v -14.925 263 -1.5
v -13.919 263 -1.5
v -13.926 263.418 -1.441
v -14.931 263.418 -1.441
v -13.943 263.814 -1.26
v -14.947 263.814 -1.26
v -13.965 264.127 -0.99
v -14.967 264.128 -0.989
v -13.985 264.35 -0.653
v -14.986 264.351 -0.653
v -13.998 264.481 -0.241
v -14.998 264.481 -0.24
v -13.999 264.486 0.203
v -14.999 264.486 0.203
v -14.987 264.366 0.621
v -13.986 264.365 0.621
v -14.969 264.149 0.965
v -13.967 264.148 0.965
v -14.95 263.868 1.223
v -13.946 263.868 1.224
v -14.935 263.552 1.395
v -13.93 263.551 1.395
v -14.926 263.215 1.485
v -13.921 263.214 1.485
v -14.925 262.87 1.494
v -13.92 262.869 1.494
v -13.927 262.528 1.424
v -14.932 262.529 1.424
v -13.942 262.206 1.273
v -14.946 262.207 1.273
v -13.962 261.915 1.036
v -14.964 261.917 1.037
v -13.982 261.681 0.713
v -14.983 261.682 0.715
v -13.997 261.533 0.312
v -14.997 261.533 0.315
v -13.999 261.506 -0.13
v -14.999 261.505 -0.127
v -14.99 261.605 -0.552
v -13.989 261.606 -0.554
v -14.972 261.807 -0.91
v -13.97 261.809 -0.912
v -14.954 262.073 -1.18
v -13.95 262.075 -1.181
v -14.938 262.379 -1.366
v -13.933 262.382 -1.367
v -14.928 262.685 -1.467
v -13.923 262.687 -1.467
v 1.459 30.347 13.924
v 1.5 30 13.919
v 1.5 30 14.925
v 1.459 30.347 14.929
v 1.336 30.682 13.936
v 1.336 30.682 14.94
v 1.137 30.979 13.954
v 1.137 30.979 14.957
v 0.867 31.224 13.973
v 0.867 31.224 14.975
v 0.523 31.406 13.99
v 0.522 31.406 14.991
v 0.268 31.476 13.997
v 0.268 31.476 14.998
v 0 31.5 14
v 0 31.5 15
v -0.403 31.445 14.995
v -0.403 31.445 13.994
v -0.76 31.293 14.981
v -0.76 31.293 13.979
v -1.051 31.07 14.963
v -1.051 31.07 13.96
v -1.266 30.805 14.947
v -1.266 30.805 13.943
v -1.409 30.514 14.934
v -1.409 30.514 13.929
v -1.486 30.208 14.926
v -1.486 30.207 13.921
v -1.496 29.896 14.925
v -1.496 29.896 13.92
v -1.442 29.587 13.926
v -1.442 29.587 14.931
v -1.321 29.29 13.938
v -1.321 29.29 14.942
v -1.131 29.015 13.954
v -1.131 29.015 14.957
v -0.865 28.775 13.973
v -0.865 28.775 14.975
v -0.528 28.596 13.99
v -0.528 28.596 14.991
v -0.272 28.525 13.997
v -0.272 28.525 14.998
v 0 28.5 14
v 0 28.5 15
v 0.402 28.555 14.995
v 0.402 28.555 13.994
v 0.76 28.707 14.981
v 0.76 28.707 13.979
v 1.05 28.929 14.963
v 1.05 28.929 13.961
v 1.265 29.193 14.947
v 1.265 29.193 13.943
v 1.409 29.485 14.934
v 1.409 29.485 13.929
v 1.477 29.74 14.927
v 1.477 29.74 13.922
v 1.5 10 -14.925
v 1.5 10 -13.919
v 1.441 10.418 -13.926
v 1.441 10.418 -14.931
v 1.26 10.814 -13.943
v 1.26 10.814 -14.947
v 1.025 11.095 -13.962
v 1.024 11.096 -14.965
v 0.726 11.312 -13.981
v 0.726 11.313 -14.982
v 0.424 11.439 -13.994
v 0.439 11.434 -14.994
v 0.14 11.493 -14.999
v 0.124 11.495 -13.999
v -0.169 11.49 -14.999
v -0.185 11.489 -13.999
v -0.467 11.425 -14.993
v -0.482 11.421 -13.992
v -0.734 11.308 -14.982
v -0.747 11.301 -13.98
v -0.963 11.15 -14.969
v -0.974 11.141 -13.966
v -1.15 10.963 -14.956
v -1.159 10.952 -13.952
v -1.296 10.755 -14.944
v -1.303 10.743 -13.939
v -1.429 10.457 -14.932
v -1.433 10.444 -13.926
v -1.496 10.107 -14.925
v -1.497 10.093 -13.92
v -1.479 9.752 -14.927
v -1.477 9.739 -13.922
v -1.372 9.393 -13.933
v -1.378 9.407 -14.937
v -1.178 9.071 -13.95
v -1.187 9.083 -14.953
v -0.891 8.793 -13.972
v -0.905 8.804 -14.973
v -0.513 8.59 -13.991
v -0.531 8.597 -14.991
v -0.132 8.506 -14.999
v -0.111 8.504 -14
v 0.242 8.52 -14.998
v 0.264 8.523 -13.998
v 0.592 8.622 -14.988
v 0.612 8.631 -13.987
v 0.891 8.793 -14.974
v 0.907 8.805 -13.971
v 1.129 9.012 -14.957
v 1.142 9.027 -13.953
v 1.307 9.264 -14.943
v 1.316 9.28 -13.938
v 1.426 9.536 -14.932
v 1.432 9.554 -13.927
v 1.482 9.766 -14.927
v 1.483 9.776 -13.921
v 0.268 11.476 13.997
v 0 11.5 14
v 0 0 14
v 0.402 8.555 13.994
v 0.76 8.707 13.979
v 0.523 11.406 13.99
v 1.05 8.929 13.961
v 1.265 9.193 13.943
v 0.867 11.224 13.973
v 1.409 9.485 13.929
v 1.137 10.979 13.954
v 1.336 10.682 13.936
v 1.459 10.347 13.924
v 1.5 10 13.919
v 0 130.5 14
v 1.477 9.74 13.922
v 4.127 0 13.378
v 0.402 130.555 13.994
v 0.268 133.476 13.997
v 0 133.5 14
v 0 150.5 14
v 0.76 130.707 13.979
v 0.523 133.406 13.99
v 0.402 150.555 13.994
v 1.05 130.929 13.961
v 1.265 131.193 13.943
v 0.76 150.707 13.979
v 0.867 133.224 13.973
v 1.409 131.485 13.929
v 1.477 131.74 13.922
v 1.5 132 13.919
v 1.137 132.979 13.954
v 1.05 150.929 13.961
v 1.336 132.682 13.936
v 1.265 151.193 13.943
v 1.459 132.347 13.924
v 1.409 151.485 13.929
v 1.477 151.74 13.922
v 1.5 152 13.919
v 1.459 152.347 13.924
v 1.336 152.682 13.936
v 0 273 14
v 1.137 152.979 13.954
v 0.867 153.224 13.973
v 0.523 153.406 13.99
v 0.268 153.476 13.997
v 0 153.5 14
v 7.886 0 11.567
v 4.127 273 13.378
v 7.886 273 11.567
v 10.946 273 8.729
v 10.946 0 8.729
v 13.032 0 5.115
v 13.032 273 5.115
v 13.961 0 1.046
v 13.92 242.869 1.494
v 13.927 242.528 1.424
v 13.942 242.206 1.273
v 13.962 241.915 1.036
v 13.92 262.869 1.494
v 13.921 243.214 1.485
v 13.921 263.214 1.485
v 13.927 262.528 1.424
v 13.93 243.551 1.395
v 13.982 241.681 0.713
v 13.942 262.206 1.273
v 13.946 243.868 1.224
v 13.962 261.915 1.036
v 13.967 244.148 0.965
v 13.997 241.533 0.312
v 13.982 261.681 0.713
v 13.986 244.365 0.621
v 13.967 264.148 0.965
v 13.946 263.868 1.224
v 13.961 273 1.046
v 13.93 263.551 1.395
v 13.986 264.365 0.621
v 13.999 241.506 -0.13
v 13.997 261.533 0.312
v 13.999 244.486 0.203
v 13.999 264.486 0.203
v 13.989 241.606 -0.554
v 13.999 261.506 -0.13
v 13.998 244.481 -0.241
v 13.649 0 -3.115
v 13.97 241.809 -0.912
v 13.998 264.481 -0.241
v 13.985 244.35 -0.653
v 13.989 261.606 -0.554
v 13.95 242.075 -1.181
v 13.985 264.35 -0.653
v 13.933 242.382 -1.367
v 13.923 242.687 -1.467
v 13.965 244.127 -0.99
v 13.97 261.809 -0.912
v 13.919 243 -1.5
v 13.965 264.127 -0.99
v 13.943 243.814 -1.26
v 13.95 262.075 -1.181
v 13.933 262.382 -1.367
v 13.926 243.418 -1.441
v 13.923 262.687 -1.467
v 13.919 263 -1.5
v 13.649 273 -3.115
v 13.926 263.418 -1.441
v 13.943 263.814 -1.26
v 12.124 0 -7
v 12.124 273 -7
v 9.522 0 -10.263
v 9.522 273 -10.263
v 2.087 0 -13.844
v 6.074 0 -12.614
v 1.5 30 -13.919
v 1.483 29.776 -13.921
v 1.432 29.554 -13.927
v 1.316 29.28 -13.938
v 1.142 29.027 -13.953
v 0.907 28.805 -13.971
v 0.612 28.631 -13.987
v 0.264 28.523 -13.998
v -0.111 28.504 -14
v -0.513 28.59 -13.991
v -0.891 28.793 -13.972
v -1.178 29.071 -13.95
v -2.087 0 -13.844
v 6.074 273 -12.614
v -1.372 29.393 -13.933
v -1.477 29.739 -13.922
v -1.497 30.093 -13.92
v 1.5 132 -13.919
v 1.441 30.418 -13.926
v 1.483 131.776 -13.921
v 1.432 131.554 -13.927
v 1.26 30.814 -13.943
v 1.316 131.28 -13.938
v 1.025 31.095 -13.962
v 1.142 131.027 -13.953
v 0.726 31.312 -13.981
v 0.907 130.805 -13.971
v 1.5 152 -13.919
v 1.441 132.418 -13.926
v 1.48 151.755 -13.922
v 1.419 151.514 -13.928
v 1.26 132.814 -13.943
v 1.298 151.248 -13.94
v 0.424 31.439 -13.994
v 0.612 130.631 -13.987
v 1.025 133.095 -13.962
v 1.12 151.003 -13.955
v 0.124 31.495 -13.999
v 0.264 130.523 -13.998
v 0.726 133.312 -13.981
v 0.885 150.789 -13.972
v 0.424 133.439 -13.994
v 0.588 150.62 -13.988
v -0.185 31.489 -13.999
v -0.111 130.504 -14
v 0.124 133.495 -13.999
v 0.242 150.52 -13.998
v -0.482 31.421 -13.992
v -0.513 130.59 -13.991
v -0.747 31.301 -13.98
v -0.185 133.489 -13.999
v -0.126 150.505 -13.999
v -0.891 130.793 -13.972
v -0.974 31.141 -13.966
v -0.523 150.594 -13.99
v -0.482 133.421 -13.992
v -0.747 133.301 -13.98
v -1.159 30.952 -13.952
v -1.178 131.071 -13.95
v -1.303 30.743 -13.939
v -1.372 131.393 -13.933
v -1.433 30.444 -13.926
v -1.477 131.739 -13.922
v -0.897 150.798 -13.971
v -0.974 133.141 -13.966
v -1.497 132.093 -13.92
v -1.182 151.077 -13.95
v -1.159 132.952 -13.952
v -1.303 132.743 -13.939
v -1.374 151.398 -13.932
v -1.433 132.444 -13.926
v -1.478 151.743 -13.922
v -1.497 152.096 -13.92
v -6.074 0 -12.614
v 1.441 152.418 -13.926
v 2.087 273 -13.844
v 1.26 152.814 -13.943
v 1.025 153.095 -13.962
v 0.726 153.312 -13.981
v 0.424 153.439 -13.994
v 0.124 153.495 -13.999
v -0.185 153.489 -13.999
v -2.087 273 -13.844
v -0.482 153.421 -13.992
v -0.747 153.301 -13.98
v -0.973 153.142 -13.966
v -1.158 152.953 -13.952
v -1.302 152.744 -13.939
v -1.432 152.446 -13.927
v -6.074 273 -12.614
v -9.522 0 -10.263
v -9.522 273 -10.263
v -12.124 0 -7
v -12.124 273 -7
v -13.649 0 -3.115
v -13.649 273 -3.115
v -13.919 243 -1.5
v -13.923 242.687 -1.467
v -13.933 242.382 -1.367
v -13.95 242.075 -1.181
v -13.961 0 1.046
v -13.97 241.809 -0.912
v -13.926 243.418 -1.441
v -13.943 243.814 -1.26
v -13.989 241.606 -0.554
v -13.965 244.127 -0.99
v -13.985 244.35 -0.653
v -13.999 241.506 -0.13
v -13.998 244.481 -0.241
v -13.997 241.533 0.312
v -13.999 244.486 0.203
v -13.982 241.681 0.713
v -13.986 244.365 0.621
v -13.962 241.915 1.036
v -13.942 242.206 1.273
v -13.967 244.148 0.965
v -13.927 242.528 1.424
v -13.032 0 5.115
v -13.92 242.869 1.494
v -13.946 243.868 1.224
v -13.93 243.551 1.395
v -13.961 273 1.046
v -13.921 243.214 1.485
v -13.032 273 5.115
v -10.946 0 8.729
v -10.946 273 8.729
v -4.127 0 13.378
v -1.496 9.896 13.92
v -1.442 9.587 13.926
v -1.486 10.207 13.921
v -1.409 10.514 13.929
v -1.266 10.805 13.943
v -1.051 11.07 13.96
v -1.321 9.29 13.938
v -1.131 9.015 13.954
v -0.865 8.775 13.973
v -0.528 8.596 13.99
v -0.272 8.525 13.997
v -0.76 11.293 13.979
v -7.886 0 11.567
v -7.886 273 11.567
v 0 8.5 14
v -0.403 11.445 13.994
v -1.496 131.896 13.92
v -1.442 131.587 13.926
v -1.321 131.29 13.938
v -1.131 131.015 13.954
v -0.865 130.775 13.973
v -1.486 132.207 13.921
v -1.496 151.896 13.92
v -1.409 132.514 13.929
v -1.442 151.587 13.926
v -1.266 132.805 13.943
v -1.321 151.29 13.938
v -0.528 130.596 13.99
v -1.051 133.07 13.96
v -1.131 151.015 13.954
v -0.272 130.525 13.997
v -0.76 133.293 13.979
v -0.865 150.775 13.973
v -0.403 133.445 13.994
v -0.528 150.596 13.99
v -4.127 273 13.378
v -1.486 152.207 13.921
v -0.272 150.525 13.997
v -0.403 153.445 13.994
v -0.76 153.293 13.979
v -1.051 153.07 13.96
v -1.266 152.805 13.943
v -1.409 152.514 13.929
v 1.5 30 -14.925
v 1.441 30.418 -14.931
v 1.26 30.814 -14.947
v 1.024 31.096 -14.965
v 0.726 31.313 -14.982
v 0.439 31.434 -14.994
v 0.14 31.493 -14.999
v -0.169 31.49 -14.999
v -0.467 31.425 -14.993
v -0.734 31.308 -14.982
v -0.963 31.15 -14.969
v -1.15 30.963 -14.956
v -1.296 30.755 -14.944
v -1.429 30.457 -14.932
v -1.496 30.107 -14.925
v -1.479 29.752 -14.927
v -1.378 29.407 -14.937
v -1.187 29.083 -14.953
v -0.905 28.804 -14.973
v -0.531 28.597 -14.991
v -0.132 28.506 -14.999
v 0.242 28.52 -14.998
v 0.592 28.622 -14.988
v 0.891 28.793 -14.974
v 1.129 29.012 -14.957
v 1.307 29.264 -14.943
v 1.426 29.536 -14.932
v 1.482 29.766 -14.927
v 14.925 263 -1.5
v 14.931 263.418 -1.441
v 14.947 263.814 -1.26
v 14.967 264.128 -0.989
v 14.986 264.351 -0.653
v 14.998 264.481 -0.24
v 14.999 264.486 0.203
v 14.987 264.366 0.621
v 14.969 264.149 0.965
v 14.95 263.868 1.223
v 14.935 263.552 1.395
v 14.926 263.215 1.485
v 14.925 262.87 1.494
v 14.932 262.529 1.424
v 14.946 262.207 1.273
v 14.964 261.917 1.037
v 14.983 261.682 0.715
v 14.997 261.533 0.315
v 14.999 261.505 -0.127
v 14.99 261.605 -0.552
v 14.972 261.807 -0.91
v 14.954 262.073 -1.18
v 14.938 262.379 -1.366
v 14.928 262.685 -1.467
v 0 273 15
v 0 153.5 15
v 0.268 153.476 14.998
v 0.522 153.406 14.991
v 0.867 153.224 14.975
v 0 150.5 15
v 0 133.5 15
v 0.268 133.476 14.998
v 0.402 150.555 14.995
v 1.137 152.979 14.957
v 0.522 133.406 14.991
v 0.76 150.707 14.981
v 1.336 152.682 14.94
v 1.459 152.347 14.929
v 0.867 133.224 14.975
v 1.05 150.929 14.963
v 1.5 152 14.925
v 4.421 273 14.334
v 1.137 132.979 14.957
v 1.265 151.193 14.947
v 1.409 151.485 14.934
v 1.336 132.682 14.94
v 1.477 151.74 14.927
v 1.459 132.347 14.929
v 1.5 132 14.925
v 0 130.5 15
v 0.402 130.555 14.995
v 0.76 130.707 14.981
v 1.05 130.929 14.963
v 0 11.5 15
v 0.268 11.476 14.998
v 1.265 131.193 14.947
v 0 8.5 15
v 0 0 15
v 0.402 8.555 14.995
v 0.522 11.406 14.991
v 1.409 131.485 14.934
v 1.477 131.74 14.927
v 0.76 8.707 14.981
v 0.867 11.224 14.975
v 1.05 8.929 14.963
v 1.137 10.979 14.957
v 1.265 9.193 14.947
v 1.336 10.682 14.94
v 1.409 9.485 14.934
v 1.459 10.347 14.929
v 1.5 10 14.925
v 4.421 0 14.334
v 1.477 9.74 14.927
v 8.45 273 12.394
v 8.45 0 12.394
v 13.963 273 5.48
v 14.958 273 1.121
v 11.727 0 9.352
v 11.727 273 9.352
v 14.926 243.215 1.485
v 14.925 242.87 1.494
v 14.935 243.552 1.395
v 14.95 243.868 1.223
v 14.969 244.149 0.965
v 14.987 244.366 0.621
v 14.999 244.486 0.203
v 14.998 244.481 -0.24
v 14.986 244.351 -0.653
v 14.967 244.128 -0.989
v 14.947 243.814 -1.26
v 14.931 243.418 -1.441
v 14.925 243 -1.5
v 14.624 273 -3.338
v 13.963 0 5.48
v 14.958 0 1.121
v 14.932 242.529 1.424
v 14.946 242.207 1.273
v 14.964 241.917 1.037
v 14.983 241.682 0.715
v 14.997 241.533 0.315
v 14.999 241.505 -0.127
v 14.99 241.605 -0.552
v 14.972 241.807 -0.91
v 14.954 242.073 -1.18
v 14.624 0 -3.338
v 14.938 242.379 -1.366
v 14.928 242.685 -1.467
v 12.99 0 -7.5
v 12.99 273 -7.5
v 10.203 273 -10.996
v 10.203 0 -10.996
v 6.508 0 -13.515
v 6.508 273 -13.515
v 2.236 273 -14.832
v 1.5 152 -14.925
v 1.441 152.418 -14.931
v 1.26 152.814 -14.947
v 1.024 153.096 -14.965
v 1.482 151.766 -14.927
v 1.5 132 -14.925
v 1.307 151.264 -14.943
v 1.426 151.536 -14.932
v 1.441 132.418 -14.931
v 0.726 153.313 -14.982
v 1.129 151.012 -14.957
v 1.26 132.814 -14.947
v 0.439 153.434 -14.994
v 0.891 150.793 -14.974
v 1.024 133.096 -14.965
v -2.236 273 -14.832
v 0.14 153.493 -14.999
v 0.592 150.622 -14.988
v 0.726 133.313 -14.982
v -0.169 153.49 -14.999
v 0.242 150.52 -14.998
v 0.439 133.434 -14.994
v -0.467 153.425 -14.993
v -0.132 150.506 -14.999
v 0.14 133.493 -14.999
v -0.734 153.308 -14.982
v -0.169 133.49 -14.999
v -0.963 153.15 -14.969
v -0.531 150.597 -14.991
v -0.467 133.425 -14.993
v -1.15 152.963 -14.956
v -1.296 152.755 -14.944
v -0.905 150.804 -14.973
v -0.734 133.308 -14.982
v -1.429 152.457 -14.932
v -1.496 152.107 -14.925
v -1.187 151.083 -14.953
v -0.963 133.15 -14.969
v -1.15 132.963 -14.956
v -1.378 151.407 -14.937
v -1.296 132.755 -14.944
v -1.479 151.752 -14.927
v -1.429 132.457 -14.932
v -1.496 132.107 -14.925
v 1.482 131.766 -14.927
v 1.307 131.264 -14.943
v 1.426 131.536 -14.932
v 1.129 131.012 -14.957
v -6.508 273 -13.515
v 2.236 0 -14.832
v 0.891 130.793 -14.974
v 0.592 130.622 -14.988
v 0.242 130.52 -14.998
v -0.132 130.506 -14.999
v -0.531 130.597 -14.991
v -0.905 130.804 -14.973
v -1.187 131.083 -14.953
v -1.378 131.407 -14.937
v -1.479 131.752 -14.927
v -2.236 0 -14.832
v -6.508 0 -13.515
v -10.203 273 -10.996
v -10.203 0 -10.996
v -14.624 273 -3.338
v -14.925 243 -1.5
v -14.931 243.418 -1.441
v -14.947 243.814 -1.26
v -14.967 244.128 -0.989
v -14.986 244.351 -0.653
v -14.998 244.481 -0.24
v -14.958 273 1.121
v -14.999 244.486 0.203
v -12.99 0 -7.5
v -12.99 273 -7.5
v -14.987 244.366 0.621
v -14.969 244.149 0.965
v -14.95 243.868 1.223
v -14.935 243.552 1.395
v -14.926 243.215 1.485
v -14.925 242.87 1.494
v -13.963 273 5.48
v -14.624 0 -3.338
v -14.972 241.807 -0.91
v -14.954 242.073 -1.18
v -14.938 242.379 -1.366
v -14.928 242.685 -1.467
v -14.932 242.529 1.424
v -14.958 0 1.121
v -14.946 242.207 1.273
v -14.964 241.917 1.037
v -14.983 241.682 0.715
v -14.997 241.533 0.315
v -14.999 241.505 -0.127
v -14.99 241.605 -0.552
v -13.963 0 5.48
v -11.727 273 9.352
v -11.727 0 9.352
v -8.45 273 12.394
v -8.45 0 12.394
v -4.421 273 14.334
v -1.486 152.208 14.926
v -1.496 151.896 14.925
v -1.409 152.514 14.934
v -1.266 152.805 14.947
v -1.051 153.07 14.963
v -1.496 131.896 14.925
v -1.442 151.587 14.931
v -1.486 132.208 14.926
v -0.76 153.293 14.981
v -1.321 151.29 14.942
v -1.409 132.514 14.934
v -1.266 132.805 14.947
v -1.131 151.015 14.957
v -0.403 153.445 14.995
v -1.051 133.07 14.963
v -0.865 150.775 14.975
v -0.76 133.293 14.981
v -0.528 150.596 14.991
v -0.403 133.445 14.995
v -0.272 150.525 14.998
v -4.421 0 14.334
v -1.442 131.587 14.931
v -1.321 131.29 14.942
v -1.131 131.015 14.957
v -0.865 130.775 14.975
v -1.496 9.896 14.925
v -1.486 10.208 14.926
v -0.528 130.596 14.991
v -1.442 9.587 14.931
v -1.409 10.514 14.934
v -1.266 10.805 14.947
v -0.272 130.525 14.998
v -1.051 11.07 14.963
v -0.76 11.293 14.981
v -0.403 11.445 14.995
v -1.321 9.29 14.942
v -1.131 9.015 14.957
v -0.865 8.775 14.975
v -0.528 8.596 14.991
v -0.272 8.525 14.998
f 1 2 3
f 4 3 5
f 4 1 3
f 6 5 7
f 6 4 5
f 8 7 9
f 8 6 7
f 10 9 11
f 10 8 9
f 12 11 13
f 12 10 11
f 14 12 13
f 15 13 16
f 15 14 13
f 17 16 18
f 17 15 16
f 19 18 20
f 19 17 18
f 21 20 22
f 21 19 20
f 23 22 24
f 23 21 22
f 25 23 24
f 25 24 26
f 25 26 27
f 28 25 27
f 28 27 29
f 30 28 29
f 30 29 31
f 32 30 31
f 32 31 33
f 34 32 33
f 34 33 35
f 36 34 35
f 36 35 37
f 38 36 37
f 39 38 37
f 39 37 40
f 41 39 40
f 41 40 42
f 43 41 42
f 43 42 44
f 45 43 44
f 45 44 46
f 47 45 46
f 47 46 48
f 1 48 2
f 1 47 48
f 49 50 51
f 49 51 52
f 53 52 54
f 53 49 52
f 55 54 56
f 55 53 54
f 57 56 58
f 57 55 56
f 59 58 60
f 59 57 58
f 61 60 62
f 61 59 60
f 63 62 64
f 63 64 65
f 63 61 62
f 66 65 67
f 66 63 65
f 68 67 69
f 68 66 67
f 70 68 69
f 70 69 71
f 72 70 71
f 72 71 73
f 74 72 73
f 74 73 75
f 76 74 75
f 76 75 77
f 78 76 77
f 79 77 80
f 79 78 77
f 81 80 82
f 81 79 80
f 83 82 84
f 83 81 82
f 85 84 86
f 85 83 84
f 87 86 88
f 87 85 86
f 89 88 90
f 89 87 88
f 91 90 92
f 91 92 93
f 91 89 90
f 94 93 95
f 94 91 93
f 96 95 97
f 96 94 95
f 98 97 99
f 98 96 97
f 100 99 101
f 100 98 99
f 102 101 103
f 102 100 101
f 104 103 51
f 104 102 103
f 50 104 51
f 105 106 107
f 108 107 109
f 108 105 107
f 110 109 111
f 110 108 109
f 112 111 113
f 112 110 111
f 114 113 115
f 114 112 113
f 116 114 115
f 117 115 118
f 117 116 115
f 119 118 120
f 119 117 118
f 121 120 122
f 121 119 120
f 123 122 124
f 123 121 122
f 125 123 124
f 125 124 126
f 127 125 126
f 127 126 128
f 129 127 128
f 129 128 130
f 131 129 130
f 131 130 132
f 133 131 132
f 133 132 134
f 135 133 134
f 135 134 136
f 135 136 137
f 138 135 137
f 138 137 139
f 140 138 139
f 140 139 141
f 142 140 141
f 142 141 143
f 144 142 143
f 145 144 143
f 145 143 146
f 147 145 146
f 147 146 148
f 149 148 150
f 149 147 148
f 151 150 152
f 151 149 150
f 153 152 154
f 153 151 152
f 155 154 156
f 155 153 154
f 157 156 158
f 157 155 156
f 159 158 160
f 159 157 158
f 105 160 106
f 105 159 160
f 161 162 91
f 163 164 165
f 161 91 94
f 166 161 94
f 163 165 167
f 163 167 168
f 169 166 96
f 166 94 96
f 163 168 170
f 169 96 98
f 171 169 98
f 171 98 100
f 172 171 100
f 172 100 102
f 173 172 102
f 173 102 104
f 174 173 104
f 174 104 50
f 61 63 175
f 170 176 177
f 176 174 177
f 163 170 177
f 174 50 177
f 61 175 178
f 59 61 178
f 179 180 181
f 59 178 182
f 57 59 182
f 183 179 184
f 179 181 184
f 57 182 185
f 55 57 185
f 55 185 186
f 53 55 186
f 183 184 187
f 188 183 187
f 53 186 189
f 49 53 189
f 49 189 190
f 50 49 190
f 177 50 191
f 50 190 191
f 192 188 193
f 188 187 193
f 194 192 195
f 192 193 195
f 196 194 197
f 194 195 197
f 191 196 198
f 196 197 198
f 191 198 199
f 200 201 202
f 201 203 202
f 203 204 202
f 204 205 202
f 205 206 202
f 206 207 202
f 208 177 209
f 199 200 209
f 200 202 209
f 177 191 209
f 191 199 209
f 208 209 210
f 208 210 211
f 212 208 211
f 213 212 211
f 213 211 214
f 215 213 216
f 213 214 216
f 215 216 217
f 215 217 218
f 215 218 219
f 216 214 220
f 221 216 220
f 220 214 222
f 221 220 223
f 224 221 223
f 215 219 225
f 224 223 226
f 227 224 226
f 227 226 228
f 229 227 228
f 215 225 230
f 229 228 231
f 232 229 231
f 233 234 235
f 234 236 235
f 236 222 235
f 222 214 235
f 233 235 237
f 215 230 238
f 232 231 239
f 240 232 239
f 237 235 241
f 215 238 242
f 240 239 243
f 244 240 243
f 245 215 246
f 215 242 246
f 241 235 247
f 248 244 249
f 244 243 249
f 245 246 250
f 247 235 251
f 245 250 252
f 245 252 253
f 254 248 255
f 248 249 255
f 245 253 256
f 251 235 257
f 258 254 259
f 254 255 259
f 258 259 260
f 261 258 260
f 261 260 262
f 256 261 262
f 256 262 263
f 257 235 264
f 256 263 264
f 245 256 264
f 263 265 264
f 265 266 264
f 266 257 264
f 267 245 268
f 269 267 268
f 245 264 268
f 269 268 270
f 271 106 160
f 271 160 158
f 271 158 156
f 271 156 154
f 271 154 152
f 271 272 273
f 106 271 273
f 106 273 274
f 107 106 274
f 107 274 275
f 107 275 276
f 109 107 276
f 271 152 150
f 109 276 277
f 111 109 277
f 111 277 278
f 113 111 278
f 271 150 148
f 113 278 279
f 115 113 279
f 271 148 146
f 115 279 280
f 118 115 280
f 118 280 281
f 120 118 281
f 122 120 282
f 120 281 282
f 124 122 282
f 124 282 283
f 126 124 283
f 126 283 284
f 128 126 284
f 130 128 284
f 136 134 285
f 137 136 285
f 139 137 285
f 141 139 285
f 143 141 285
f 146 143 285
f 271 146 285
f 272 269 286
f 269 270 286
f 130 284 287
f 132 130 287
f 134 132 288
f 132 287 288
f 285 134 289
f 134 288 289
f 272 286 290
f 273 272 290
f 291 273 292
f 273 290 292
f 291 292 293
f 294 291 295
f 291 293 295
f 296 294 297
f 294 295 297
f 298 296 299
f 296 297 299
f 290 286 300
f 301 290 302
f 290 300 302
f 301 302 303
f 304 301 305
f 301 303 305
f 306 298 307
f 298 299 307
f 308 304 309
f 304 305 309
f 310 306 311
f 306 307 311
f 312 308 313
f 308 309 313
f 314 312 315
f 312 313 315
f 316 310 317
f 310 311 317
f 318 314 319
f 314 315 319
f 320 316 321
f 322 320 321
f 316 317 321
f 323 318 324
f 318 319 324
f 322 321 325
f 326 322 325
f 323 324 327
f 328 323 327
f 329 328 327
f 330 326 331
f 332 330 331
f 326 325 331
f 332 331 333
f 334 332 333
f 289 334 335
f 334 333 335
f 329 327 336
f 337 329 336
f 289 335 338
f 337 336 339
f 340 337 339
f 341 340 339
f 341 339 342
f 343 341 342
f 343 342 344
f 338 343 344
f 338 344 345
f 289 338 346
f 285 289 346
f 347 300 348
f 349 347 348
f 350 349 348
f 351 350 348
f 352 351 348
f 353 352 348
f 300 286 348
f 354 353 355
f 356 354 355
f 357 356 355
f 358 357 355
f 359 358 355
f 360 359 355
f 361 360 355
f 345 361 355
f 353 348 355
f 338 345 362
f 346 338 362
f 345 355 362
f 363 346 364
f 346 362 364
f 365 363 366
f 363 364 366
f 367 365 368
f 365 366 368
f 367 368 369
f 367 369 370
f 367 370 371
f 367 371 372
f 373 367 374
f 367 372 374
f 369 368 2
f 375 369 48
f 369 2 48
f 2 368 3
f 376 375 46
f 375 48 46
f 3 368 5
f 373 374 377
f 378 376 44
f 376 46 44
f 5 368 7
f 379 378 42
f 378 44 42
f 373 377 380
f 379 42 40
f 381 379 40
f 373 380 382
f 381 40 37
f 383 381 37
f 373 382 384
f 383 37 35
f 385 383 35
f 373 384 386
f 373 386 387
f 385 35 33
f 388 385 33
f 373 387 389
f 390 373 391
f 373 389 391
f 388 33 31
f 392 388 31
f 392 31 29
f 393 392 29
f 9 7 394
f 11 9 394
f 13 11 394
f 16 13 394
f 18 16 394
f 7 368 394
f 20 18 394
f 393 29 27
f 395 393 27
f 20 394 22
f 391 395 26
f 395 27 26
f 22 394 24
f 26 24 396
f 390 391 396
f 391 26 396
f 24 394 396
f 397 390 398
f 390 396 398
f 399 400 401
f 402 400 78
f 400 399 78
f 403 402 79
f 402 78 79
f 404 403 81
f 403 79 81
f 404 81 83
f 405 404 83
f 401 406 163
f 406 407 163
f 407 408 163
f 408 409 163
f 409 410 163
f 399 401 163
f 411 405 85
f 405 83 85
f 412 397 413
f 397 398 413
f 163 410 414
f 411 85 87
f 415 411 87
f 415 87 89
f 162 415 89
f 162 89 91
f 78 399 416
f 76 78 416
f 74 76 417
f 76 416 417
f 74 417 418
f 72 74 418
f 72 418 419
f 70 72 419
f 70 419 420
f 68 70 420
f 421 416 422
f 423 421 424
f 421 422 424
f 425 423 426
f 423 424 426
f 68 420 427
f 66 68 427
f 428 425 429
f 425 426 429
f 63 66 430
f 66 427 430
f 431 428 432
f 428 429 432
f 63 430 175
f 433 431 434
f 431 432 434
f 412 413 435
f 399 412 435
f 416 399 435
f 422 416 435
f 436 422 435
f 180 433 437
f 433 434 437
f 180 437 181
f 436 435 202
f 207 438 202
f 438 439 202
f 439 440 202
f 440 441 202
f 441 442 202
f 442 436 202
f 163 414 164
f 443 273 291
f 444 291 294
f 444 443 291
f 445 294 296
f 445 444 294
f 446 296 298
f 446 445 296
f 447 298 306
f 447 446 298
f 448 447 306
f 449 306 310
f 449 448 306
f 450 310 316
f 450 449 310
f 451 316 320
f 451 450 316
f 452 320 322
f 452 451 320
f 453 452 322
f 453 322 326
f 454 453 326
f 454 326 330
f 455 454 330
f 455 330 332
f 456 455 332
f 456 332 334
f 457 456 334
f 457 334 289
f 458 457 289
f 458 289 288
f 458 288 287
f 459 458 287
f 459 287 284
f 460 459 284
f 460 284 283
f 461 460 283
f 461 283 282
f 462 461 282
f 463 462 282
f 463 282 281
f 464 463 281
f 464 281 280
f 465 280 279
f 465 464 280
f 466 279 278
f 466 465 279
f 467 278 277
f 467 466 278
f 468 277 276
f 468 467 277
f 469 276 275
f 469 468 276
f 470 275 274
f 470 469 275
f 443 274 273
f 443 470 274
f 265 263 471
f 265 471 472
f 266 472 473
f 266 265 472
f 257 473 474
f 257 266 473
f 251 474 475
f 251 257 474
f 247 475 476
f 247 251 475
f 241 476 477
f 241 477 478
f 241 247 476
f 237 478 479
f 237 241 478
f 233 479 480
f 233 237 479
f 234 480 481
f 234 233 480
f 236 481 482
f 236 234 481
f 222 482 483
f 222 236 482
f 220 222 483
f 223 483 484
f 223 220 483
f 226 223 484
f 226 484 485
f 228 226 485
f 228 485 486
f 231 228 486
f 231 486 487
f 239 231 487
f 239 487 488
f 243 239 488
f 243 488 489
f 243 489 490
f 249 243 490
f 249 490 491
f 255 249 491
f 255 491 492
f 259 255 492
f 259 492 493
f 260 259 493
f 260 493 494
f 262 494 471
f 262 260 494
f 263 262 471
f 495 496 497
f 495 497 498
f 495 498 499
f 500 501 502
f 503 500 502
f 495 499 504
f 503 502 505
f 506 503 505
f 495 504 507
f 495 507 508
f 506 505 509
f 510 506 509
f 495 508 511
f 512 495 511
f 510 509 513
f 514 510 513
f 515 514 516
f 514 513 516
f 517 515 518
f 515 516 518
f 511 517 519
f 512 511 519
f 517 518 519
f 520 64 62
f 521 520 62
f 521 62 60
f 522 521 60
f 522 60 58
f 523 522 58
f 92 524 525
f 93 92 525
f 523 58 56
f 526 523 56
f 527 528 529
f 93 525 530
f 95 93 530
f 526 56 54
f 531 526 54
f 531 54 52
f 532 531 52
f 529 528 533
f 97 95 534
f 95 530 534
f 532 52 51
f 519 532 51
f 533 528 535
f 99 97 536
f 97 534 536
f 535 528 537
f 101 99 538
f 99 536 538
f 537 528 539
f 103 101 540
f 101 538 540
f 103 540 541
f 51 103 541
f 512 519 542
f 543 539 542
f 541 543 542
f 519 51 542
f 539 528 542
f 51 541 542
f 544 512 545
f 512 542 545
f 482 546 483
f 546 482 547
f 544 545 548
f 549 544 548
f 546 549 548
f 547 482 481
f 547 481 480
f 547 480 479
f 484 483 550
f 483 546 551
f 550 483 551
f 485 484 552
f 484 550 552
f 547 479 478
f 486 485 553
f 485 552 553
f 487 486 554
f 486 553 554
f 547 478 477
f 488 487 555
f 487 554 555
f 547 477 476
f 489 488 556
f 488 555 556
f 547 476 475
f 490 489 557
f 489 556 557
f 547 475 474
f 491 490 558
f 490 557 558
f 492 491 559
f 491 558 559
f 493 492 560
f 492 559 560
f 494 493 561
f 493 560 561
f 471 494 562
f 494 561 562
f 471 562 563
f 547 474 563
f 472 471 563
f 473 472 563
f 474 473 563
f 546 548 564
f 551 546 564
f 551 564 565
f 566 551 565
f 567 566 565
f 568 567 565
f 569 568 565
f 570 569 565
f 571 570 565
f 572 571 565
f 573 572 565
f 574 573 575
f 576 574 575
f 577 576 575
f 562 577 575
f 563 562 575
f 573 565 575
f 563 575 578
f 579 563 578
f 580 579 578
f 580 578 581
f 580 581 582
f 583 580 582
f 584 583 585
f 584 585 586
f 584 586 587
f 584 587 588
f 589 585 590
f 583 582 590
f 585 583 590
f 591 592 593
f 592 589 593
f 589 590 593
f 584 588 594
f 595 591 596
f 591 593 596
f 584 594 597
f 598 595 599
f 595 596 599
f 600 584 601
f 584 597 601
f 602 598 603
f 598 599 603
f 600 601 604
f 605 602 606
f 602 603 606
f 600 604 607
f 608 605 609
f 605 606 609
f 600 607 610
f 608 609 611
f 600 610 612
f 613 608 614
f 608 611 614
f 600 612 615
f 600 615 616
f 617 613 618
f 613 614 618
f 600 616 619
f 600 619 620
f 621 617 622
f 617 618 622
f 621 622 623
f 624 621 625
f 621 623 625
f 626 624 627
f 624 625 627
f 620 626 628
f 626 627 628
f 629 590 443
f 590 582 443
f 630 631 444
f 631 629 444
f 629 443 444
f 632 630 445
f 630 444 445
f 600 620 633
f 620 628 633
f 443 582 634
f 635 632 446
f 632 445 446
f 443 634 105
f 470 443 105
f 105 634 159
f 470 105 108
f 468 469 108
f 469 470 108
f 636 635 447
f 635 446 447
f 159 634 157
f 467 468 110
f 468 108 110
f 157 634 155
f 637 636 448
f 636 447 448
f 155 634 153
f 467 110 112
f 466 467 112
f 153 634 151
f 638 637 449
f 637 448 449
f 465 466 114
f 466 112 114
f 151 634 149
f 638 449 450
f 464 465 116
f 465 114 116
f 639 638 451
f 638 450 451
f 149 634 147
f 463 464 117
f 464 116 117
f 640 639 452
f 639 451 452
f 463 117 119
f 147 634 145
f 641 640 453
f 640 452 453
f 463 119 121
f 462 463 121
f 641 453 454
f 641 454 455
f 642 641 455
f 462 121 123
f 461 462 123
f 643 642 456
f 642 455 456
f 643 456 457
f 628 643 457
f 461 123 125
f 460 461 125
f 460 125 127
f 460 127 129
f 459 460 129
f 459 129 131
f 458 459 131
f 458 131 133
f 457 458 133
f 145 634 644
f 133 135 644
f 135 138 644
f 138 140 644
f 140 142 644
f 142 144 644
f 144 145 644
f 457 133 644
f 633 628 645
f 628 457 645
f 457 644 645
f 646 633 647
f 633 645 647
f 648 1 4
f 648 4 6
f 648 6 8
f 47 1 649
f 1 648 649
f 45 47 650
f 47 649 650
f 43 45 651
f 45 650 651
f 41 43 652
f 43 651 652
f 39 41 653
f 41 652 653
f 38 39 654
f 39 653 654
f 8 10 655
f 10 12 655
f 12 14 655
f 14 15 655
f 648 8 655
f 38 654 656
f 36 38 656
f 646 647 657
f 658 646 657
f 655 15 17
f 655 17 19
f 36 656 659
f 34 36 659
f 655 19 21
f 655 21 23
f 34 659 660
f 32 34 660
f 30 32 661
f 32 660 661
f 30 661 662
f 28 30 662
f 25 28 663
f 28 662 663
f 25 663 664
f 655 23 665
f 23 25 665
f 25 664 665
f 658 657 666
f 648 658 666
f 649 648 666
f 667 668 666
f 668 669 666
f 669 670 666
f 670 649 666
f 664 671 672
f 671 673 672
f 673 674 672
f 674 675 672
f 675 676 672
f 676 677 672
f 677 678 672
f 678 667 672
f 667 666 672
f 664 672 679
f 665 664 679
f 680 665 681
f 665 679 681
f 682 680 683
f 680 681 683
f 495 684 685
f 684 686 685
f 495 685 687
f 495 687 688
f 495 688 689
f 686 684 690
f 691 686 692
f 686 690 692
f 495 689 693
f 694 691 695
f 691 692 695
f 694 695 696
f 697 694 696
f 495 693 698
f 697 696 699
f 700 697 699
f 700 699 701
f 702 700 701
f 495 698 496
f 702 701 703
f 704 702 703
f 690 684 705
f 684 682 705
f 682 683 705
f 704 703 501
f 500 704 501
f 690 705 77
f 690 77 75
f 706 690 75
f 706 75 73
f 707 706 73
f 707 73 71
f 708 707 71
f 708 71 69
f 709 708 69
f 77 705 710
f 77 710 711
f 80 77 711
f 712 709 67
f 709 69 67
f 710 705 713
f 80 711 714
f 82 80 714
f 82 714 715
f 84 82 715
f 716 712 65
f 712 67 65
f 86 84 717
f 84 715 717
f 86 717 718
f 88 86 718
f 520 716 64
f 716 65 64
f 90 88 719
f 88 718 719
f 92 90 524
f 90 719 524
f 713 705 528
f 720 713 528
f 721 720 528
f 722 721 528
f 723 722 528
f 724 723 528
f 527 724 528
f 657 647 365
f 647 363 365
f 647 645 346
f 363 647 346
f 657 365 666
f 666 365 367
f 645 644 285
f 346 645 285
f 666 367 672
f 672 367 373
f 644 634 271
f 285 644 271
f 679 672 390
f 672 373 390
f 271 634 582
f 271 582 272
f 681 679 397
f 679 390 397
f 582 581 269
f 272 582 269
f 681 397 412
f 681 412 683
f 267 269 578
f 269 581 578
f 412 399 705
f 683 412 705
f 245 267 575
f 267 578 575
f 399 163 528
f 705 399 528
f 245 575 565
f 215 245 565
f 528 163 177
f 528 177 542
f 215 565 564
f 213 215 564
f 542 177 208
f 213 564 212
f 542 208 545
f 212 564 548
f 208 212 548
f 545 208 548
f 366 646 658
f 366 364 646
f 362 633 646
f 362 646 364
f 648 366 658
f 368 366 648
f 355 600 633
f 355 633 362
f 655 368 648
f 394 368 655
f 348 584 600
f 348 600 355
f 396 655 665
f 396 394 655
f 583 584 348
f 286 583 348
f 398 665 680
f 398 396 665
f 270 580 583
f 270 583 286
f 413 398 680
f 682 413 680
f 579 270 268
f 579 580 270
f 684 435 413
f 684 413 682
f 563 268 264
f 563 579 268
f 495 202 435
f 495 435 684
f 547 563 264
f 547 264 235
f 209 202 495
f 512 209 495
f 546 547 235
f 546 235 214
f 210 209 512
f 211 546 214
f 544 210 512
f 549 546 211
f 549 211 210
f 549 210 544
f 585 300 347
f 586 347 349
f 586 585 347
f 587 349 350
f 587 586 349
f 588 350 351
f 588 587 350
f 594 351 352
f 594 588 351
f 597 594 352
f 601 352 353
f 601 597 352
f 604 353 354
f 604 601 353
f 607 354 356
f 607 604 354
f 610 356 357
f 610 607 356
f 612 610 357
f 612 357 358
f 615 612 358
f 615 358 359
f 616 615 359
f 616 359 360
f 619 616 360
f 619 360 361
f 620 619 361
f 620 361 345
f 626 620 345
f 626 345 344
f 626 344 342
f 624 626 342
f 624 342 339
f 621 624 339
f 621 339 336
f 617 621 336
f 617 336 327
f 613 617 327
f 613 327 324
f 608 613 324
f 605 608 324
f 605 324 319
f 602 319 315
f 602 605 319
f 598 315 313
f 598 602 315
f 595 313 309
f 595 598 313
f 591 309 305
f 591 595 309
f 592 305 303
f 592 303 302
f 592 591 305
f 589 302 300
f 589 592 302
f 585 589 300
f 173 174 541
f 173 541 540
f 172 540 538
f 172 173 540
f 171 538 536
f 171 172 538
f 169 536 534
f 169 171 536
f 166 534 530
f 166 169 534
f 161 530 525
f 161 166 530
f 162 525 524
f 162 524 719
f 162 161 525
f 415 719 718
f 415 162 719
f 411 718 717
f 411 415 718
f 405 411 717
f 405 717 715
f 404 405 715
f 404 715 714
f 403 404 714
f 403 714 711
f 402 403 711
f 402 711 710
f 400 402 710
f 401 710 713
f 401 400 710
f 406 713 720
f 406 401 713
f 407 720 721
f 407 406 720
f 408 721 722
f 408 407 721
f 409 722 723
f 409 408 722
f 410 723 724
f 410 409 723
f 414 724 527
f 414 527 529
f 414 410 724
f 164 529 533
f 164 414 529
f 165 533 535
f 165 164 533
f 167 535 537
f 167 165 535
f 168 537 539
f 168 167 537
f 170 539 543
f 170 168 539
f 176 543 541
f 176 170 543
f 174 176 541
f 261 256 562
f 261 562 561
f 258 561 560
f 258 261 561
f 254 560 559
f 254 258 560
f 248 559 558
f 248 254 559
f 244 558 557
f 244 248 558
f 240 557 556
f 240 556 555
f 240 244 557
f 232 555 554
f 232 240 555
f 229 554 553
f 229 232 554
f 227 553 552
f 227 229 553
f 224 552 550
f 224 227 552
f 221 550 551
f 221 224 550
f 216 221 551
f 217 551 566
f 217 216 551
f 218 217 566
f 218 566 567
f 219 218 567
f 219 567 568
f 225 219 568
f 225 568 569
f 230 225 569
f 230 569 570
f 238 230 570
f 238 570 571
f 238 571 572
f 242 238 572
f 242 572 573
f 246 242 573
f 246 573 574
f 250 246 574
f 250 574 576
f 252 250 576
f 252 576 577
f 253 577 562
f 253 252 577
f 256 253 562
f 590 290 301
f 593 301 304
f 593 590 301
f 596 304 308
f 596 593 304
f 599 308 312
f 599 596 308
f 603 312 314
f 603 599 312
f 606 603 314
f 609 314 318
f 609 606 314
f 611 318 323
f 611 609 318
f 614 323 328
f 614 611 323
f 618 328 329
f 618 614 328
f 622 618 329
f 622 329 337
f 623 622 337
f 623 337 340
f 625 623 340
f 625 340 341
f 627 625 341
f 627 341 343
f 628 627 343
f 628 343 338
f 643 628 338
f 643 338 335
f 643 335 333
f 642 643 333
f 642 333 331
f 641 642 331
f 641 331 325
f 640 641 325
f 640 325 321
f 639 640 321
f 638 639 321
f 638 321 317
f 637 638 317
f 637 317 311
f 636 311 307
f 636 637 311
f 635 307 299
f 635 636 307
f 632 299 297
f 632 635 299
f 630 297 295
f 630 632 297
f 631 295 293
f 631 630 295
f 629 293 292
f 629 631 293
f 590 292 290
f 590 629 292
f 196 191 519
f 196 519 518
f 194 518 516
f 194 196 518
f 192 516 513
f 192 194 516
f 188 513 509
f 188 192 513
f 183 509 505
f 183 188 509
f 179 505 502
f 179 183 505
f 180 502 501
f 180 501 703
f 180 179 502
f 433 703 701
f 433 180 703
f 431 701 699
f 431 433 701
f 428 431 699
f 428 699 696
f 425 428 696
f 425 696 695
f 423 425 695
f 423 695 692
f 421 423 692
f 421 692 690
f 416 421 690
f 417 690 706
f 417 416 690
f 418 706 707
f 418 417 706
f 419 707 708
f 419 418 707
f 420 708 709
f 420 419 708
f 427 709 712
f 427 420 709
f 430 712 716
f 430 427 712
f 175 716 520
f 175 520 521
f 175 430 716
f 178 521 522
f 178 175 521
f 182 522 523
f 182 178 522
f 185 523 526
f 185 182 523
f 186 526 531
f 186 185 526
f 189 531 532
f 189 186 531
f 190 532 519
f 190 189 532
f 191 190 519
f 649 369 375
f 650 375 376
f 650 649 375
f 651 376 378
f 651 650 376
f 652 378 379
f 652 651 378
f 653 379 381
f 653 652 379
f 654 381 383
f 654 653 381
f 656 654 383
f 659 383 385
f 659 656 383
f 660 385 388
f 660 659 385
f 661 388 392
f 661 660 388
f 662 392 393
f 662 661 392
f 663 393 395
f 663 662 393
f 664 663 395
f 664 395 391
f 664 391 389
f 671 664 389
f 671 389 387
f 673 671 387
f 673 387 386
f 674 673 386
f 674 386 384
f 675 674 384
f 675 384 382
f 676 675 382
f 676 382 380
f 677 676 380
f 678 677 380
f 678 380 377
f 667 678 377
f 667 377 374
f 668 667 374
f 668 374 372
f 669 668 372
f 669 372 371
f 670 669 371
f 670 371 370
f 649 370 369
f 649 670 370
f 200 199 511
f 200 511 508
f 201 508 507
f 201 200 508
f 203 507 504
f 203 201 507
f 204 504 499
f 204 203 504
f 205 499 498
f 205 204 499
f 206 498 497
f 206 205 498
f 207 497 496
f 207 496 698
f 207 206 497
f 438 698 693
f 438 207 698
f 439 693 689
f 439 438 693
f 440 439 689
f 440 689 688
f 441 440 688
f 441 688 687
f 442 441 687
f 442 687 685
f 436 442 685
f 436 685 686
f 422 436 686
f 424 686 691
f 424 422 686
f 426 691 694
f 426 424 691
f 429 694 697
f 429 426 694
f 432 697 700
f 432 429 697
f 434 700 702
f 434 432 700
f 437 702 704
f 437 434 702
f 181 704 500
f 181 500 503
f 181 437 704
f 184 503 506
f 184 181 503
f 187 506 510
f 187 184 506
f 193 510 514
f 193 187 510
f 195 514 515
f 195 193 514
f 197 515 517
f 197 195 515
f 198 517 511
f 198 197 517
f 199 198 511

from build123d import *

# Parameters (mm, degrees)
SKETCH_1_R               = 15
EXTRUDE_1_DEPTH          = 273
CUT_EXTRUDE_1_DEPTH      = 274.822935489
CUT_EXTRUDE_1_DEPTH_BACK = 274.822935489
SKETCH_2_R               = 1.5
CUT_EXTRUDE_2_DEPTH      = 274.8229356
CUT_EXTRUDE_2_DEPTH_BACK = 274.8229356
SKETCH_3_R               = 1.5
CUT_EXTRUDE_3_REACH      = 275.823
SKETCH_4_R               = 14


with BuildPart() as part:
    # 草圖1 → 填料-伸長1 (new body)
    with BuildSketch(Plane(origin=(0, 0, 0), x_dir=(1, 0, 0), z_dir=(0, 1, 0))):
        with Locations(Location((0, 0, 0), (0, 0, 270))):
            Circle(SKETCH_1_R)
    extrude(amount=EXTRUDE_1_DEPTH)

    # 草圖2 → 除料-伸長1 (cut, two sides: drawn at the far end of the back side and taken through both)
    with BuildSketch(Plane.XY.offset(-CUT_EXTRUDE_1_DEPTH_BACK)):
        with Locations((0, 10)):
            Circle(SKETCH_2_R)
        with Locations((0, 30)):
            Circle(SKETCH_2_R)
        with Locations((0, 132)):
            Circle(SKETCH_2_R)
        with Locations((0, 152)):
            Circle(SKETCH_2_R)
    extrude(amount=CUT_EXTRUDE_1_DEPTH + CUT_EXTRUDE_1_DEPTH_BACK, mode=Mode.SUBTRACT)

    # 草圖3 → 除料-伸長2 (cut, two sides: drawn at the far end of the back side and taken through both)
    with BuildSketch(Plane(origin=(0, 0, 0), x_dir=(0, 0, -1), z_dir=(1, 0, 0)).offset(-CUT_EXTRUDE_2_DEPTH_BACK)):
        with Locations((0, 263)):
            Circle(SKETCH_3_R)
        with Locations((0, 243)):
            Circle(SKETCH_3_R)
    extrude(amount=CUT_EXTRUDE_2_DEPTH + CUT_EXTRUDE_2_DEPTH_BACK, mode=Mode.SUBTRACT)

    # 草圖4 → 除料-伸長3 (cut, up to next)
    with BuildSketch(Plane(origin=(0, 273, 0), x_dir=(1, 0, 0), z_dir=(0, 1, 0)), mode=Mode.PRIVATE) as cut_extrude_3_sk1:
        with Locations(Location((0, 0, 0), (0, 0, 270))):
            Circle(SKETCH_4_R)
    cut_extrude_3_tool1 = extrude(cut_extrude_3_sk1.sketch, amount=-CUT_EXTRUDE_3_REACH, mode=Mode.PRIVATE) & part.part
    add(cut_extrude_3_tool1.solids().sort_by_distance((0, 273, 0))[0], mode=Mode.SUBTRACT)


solid = part.part
